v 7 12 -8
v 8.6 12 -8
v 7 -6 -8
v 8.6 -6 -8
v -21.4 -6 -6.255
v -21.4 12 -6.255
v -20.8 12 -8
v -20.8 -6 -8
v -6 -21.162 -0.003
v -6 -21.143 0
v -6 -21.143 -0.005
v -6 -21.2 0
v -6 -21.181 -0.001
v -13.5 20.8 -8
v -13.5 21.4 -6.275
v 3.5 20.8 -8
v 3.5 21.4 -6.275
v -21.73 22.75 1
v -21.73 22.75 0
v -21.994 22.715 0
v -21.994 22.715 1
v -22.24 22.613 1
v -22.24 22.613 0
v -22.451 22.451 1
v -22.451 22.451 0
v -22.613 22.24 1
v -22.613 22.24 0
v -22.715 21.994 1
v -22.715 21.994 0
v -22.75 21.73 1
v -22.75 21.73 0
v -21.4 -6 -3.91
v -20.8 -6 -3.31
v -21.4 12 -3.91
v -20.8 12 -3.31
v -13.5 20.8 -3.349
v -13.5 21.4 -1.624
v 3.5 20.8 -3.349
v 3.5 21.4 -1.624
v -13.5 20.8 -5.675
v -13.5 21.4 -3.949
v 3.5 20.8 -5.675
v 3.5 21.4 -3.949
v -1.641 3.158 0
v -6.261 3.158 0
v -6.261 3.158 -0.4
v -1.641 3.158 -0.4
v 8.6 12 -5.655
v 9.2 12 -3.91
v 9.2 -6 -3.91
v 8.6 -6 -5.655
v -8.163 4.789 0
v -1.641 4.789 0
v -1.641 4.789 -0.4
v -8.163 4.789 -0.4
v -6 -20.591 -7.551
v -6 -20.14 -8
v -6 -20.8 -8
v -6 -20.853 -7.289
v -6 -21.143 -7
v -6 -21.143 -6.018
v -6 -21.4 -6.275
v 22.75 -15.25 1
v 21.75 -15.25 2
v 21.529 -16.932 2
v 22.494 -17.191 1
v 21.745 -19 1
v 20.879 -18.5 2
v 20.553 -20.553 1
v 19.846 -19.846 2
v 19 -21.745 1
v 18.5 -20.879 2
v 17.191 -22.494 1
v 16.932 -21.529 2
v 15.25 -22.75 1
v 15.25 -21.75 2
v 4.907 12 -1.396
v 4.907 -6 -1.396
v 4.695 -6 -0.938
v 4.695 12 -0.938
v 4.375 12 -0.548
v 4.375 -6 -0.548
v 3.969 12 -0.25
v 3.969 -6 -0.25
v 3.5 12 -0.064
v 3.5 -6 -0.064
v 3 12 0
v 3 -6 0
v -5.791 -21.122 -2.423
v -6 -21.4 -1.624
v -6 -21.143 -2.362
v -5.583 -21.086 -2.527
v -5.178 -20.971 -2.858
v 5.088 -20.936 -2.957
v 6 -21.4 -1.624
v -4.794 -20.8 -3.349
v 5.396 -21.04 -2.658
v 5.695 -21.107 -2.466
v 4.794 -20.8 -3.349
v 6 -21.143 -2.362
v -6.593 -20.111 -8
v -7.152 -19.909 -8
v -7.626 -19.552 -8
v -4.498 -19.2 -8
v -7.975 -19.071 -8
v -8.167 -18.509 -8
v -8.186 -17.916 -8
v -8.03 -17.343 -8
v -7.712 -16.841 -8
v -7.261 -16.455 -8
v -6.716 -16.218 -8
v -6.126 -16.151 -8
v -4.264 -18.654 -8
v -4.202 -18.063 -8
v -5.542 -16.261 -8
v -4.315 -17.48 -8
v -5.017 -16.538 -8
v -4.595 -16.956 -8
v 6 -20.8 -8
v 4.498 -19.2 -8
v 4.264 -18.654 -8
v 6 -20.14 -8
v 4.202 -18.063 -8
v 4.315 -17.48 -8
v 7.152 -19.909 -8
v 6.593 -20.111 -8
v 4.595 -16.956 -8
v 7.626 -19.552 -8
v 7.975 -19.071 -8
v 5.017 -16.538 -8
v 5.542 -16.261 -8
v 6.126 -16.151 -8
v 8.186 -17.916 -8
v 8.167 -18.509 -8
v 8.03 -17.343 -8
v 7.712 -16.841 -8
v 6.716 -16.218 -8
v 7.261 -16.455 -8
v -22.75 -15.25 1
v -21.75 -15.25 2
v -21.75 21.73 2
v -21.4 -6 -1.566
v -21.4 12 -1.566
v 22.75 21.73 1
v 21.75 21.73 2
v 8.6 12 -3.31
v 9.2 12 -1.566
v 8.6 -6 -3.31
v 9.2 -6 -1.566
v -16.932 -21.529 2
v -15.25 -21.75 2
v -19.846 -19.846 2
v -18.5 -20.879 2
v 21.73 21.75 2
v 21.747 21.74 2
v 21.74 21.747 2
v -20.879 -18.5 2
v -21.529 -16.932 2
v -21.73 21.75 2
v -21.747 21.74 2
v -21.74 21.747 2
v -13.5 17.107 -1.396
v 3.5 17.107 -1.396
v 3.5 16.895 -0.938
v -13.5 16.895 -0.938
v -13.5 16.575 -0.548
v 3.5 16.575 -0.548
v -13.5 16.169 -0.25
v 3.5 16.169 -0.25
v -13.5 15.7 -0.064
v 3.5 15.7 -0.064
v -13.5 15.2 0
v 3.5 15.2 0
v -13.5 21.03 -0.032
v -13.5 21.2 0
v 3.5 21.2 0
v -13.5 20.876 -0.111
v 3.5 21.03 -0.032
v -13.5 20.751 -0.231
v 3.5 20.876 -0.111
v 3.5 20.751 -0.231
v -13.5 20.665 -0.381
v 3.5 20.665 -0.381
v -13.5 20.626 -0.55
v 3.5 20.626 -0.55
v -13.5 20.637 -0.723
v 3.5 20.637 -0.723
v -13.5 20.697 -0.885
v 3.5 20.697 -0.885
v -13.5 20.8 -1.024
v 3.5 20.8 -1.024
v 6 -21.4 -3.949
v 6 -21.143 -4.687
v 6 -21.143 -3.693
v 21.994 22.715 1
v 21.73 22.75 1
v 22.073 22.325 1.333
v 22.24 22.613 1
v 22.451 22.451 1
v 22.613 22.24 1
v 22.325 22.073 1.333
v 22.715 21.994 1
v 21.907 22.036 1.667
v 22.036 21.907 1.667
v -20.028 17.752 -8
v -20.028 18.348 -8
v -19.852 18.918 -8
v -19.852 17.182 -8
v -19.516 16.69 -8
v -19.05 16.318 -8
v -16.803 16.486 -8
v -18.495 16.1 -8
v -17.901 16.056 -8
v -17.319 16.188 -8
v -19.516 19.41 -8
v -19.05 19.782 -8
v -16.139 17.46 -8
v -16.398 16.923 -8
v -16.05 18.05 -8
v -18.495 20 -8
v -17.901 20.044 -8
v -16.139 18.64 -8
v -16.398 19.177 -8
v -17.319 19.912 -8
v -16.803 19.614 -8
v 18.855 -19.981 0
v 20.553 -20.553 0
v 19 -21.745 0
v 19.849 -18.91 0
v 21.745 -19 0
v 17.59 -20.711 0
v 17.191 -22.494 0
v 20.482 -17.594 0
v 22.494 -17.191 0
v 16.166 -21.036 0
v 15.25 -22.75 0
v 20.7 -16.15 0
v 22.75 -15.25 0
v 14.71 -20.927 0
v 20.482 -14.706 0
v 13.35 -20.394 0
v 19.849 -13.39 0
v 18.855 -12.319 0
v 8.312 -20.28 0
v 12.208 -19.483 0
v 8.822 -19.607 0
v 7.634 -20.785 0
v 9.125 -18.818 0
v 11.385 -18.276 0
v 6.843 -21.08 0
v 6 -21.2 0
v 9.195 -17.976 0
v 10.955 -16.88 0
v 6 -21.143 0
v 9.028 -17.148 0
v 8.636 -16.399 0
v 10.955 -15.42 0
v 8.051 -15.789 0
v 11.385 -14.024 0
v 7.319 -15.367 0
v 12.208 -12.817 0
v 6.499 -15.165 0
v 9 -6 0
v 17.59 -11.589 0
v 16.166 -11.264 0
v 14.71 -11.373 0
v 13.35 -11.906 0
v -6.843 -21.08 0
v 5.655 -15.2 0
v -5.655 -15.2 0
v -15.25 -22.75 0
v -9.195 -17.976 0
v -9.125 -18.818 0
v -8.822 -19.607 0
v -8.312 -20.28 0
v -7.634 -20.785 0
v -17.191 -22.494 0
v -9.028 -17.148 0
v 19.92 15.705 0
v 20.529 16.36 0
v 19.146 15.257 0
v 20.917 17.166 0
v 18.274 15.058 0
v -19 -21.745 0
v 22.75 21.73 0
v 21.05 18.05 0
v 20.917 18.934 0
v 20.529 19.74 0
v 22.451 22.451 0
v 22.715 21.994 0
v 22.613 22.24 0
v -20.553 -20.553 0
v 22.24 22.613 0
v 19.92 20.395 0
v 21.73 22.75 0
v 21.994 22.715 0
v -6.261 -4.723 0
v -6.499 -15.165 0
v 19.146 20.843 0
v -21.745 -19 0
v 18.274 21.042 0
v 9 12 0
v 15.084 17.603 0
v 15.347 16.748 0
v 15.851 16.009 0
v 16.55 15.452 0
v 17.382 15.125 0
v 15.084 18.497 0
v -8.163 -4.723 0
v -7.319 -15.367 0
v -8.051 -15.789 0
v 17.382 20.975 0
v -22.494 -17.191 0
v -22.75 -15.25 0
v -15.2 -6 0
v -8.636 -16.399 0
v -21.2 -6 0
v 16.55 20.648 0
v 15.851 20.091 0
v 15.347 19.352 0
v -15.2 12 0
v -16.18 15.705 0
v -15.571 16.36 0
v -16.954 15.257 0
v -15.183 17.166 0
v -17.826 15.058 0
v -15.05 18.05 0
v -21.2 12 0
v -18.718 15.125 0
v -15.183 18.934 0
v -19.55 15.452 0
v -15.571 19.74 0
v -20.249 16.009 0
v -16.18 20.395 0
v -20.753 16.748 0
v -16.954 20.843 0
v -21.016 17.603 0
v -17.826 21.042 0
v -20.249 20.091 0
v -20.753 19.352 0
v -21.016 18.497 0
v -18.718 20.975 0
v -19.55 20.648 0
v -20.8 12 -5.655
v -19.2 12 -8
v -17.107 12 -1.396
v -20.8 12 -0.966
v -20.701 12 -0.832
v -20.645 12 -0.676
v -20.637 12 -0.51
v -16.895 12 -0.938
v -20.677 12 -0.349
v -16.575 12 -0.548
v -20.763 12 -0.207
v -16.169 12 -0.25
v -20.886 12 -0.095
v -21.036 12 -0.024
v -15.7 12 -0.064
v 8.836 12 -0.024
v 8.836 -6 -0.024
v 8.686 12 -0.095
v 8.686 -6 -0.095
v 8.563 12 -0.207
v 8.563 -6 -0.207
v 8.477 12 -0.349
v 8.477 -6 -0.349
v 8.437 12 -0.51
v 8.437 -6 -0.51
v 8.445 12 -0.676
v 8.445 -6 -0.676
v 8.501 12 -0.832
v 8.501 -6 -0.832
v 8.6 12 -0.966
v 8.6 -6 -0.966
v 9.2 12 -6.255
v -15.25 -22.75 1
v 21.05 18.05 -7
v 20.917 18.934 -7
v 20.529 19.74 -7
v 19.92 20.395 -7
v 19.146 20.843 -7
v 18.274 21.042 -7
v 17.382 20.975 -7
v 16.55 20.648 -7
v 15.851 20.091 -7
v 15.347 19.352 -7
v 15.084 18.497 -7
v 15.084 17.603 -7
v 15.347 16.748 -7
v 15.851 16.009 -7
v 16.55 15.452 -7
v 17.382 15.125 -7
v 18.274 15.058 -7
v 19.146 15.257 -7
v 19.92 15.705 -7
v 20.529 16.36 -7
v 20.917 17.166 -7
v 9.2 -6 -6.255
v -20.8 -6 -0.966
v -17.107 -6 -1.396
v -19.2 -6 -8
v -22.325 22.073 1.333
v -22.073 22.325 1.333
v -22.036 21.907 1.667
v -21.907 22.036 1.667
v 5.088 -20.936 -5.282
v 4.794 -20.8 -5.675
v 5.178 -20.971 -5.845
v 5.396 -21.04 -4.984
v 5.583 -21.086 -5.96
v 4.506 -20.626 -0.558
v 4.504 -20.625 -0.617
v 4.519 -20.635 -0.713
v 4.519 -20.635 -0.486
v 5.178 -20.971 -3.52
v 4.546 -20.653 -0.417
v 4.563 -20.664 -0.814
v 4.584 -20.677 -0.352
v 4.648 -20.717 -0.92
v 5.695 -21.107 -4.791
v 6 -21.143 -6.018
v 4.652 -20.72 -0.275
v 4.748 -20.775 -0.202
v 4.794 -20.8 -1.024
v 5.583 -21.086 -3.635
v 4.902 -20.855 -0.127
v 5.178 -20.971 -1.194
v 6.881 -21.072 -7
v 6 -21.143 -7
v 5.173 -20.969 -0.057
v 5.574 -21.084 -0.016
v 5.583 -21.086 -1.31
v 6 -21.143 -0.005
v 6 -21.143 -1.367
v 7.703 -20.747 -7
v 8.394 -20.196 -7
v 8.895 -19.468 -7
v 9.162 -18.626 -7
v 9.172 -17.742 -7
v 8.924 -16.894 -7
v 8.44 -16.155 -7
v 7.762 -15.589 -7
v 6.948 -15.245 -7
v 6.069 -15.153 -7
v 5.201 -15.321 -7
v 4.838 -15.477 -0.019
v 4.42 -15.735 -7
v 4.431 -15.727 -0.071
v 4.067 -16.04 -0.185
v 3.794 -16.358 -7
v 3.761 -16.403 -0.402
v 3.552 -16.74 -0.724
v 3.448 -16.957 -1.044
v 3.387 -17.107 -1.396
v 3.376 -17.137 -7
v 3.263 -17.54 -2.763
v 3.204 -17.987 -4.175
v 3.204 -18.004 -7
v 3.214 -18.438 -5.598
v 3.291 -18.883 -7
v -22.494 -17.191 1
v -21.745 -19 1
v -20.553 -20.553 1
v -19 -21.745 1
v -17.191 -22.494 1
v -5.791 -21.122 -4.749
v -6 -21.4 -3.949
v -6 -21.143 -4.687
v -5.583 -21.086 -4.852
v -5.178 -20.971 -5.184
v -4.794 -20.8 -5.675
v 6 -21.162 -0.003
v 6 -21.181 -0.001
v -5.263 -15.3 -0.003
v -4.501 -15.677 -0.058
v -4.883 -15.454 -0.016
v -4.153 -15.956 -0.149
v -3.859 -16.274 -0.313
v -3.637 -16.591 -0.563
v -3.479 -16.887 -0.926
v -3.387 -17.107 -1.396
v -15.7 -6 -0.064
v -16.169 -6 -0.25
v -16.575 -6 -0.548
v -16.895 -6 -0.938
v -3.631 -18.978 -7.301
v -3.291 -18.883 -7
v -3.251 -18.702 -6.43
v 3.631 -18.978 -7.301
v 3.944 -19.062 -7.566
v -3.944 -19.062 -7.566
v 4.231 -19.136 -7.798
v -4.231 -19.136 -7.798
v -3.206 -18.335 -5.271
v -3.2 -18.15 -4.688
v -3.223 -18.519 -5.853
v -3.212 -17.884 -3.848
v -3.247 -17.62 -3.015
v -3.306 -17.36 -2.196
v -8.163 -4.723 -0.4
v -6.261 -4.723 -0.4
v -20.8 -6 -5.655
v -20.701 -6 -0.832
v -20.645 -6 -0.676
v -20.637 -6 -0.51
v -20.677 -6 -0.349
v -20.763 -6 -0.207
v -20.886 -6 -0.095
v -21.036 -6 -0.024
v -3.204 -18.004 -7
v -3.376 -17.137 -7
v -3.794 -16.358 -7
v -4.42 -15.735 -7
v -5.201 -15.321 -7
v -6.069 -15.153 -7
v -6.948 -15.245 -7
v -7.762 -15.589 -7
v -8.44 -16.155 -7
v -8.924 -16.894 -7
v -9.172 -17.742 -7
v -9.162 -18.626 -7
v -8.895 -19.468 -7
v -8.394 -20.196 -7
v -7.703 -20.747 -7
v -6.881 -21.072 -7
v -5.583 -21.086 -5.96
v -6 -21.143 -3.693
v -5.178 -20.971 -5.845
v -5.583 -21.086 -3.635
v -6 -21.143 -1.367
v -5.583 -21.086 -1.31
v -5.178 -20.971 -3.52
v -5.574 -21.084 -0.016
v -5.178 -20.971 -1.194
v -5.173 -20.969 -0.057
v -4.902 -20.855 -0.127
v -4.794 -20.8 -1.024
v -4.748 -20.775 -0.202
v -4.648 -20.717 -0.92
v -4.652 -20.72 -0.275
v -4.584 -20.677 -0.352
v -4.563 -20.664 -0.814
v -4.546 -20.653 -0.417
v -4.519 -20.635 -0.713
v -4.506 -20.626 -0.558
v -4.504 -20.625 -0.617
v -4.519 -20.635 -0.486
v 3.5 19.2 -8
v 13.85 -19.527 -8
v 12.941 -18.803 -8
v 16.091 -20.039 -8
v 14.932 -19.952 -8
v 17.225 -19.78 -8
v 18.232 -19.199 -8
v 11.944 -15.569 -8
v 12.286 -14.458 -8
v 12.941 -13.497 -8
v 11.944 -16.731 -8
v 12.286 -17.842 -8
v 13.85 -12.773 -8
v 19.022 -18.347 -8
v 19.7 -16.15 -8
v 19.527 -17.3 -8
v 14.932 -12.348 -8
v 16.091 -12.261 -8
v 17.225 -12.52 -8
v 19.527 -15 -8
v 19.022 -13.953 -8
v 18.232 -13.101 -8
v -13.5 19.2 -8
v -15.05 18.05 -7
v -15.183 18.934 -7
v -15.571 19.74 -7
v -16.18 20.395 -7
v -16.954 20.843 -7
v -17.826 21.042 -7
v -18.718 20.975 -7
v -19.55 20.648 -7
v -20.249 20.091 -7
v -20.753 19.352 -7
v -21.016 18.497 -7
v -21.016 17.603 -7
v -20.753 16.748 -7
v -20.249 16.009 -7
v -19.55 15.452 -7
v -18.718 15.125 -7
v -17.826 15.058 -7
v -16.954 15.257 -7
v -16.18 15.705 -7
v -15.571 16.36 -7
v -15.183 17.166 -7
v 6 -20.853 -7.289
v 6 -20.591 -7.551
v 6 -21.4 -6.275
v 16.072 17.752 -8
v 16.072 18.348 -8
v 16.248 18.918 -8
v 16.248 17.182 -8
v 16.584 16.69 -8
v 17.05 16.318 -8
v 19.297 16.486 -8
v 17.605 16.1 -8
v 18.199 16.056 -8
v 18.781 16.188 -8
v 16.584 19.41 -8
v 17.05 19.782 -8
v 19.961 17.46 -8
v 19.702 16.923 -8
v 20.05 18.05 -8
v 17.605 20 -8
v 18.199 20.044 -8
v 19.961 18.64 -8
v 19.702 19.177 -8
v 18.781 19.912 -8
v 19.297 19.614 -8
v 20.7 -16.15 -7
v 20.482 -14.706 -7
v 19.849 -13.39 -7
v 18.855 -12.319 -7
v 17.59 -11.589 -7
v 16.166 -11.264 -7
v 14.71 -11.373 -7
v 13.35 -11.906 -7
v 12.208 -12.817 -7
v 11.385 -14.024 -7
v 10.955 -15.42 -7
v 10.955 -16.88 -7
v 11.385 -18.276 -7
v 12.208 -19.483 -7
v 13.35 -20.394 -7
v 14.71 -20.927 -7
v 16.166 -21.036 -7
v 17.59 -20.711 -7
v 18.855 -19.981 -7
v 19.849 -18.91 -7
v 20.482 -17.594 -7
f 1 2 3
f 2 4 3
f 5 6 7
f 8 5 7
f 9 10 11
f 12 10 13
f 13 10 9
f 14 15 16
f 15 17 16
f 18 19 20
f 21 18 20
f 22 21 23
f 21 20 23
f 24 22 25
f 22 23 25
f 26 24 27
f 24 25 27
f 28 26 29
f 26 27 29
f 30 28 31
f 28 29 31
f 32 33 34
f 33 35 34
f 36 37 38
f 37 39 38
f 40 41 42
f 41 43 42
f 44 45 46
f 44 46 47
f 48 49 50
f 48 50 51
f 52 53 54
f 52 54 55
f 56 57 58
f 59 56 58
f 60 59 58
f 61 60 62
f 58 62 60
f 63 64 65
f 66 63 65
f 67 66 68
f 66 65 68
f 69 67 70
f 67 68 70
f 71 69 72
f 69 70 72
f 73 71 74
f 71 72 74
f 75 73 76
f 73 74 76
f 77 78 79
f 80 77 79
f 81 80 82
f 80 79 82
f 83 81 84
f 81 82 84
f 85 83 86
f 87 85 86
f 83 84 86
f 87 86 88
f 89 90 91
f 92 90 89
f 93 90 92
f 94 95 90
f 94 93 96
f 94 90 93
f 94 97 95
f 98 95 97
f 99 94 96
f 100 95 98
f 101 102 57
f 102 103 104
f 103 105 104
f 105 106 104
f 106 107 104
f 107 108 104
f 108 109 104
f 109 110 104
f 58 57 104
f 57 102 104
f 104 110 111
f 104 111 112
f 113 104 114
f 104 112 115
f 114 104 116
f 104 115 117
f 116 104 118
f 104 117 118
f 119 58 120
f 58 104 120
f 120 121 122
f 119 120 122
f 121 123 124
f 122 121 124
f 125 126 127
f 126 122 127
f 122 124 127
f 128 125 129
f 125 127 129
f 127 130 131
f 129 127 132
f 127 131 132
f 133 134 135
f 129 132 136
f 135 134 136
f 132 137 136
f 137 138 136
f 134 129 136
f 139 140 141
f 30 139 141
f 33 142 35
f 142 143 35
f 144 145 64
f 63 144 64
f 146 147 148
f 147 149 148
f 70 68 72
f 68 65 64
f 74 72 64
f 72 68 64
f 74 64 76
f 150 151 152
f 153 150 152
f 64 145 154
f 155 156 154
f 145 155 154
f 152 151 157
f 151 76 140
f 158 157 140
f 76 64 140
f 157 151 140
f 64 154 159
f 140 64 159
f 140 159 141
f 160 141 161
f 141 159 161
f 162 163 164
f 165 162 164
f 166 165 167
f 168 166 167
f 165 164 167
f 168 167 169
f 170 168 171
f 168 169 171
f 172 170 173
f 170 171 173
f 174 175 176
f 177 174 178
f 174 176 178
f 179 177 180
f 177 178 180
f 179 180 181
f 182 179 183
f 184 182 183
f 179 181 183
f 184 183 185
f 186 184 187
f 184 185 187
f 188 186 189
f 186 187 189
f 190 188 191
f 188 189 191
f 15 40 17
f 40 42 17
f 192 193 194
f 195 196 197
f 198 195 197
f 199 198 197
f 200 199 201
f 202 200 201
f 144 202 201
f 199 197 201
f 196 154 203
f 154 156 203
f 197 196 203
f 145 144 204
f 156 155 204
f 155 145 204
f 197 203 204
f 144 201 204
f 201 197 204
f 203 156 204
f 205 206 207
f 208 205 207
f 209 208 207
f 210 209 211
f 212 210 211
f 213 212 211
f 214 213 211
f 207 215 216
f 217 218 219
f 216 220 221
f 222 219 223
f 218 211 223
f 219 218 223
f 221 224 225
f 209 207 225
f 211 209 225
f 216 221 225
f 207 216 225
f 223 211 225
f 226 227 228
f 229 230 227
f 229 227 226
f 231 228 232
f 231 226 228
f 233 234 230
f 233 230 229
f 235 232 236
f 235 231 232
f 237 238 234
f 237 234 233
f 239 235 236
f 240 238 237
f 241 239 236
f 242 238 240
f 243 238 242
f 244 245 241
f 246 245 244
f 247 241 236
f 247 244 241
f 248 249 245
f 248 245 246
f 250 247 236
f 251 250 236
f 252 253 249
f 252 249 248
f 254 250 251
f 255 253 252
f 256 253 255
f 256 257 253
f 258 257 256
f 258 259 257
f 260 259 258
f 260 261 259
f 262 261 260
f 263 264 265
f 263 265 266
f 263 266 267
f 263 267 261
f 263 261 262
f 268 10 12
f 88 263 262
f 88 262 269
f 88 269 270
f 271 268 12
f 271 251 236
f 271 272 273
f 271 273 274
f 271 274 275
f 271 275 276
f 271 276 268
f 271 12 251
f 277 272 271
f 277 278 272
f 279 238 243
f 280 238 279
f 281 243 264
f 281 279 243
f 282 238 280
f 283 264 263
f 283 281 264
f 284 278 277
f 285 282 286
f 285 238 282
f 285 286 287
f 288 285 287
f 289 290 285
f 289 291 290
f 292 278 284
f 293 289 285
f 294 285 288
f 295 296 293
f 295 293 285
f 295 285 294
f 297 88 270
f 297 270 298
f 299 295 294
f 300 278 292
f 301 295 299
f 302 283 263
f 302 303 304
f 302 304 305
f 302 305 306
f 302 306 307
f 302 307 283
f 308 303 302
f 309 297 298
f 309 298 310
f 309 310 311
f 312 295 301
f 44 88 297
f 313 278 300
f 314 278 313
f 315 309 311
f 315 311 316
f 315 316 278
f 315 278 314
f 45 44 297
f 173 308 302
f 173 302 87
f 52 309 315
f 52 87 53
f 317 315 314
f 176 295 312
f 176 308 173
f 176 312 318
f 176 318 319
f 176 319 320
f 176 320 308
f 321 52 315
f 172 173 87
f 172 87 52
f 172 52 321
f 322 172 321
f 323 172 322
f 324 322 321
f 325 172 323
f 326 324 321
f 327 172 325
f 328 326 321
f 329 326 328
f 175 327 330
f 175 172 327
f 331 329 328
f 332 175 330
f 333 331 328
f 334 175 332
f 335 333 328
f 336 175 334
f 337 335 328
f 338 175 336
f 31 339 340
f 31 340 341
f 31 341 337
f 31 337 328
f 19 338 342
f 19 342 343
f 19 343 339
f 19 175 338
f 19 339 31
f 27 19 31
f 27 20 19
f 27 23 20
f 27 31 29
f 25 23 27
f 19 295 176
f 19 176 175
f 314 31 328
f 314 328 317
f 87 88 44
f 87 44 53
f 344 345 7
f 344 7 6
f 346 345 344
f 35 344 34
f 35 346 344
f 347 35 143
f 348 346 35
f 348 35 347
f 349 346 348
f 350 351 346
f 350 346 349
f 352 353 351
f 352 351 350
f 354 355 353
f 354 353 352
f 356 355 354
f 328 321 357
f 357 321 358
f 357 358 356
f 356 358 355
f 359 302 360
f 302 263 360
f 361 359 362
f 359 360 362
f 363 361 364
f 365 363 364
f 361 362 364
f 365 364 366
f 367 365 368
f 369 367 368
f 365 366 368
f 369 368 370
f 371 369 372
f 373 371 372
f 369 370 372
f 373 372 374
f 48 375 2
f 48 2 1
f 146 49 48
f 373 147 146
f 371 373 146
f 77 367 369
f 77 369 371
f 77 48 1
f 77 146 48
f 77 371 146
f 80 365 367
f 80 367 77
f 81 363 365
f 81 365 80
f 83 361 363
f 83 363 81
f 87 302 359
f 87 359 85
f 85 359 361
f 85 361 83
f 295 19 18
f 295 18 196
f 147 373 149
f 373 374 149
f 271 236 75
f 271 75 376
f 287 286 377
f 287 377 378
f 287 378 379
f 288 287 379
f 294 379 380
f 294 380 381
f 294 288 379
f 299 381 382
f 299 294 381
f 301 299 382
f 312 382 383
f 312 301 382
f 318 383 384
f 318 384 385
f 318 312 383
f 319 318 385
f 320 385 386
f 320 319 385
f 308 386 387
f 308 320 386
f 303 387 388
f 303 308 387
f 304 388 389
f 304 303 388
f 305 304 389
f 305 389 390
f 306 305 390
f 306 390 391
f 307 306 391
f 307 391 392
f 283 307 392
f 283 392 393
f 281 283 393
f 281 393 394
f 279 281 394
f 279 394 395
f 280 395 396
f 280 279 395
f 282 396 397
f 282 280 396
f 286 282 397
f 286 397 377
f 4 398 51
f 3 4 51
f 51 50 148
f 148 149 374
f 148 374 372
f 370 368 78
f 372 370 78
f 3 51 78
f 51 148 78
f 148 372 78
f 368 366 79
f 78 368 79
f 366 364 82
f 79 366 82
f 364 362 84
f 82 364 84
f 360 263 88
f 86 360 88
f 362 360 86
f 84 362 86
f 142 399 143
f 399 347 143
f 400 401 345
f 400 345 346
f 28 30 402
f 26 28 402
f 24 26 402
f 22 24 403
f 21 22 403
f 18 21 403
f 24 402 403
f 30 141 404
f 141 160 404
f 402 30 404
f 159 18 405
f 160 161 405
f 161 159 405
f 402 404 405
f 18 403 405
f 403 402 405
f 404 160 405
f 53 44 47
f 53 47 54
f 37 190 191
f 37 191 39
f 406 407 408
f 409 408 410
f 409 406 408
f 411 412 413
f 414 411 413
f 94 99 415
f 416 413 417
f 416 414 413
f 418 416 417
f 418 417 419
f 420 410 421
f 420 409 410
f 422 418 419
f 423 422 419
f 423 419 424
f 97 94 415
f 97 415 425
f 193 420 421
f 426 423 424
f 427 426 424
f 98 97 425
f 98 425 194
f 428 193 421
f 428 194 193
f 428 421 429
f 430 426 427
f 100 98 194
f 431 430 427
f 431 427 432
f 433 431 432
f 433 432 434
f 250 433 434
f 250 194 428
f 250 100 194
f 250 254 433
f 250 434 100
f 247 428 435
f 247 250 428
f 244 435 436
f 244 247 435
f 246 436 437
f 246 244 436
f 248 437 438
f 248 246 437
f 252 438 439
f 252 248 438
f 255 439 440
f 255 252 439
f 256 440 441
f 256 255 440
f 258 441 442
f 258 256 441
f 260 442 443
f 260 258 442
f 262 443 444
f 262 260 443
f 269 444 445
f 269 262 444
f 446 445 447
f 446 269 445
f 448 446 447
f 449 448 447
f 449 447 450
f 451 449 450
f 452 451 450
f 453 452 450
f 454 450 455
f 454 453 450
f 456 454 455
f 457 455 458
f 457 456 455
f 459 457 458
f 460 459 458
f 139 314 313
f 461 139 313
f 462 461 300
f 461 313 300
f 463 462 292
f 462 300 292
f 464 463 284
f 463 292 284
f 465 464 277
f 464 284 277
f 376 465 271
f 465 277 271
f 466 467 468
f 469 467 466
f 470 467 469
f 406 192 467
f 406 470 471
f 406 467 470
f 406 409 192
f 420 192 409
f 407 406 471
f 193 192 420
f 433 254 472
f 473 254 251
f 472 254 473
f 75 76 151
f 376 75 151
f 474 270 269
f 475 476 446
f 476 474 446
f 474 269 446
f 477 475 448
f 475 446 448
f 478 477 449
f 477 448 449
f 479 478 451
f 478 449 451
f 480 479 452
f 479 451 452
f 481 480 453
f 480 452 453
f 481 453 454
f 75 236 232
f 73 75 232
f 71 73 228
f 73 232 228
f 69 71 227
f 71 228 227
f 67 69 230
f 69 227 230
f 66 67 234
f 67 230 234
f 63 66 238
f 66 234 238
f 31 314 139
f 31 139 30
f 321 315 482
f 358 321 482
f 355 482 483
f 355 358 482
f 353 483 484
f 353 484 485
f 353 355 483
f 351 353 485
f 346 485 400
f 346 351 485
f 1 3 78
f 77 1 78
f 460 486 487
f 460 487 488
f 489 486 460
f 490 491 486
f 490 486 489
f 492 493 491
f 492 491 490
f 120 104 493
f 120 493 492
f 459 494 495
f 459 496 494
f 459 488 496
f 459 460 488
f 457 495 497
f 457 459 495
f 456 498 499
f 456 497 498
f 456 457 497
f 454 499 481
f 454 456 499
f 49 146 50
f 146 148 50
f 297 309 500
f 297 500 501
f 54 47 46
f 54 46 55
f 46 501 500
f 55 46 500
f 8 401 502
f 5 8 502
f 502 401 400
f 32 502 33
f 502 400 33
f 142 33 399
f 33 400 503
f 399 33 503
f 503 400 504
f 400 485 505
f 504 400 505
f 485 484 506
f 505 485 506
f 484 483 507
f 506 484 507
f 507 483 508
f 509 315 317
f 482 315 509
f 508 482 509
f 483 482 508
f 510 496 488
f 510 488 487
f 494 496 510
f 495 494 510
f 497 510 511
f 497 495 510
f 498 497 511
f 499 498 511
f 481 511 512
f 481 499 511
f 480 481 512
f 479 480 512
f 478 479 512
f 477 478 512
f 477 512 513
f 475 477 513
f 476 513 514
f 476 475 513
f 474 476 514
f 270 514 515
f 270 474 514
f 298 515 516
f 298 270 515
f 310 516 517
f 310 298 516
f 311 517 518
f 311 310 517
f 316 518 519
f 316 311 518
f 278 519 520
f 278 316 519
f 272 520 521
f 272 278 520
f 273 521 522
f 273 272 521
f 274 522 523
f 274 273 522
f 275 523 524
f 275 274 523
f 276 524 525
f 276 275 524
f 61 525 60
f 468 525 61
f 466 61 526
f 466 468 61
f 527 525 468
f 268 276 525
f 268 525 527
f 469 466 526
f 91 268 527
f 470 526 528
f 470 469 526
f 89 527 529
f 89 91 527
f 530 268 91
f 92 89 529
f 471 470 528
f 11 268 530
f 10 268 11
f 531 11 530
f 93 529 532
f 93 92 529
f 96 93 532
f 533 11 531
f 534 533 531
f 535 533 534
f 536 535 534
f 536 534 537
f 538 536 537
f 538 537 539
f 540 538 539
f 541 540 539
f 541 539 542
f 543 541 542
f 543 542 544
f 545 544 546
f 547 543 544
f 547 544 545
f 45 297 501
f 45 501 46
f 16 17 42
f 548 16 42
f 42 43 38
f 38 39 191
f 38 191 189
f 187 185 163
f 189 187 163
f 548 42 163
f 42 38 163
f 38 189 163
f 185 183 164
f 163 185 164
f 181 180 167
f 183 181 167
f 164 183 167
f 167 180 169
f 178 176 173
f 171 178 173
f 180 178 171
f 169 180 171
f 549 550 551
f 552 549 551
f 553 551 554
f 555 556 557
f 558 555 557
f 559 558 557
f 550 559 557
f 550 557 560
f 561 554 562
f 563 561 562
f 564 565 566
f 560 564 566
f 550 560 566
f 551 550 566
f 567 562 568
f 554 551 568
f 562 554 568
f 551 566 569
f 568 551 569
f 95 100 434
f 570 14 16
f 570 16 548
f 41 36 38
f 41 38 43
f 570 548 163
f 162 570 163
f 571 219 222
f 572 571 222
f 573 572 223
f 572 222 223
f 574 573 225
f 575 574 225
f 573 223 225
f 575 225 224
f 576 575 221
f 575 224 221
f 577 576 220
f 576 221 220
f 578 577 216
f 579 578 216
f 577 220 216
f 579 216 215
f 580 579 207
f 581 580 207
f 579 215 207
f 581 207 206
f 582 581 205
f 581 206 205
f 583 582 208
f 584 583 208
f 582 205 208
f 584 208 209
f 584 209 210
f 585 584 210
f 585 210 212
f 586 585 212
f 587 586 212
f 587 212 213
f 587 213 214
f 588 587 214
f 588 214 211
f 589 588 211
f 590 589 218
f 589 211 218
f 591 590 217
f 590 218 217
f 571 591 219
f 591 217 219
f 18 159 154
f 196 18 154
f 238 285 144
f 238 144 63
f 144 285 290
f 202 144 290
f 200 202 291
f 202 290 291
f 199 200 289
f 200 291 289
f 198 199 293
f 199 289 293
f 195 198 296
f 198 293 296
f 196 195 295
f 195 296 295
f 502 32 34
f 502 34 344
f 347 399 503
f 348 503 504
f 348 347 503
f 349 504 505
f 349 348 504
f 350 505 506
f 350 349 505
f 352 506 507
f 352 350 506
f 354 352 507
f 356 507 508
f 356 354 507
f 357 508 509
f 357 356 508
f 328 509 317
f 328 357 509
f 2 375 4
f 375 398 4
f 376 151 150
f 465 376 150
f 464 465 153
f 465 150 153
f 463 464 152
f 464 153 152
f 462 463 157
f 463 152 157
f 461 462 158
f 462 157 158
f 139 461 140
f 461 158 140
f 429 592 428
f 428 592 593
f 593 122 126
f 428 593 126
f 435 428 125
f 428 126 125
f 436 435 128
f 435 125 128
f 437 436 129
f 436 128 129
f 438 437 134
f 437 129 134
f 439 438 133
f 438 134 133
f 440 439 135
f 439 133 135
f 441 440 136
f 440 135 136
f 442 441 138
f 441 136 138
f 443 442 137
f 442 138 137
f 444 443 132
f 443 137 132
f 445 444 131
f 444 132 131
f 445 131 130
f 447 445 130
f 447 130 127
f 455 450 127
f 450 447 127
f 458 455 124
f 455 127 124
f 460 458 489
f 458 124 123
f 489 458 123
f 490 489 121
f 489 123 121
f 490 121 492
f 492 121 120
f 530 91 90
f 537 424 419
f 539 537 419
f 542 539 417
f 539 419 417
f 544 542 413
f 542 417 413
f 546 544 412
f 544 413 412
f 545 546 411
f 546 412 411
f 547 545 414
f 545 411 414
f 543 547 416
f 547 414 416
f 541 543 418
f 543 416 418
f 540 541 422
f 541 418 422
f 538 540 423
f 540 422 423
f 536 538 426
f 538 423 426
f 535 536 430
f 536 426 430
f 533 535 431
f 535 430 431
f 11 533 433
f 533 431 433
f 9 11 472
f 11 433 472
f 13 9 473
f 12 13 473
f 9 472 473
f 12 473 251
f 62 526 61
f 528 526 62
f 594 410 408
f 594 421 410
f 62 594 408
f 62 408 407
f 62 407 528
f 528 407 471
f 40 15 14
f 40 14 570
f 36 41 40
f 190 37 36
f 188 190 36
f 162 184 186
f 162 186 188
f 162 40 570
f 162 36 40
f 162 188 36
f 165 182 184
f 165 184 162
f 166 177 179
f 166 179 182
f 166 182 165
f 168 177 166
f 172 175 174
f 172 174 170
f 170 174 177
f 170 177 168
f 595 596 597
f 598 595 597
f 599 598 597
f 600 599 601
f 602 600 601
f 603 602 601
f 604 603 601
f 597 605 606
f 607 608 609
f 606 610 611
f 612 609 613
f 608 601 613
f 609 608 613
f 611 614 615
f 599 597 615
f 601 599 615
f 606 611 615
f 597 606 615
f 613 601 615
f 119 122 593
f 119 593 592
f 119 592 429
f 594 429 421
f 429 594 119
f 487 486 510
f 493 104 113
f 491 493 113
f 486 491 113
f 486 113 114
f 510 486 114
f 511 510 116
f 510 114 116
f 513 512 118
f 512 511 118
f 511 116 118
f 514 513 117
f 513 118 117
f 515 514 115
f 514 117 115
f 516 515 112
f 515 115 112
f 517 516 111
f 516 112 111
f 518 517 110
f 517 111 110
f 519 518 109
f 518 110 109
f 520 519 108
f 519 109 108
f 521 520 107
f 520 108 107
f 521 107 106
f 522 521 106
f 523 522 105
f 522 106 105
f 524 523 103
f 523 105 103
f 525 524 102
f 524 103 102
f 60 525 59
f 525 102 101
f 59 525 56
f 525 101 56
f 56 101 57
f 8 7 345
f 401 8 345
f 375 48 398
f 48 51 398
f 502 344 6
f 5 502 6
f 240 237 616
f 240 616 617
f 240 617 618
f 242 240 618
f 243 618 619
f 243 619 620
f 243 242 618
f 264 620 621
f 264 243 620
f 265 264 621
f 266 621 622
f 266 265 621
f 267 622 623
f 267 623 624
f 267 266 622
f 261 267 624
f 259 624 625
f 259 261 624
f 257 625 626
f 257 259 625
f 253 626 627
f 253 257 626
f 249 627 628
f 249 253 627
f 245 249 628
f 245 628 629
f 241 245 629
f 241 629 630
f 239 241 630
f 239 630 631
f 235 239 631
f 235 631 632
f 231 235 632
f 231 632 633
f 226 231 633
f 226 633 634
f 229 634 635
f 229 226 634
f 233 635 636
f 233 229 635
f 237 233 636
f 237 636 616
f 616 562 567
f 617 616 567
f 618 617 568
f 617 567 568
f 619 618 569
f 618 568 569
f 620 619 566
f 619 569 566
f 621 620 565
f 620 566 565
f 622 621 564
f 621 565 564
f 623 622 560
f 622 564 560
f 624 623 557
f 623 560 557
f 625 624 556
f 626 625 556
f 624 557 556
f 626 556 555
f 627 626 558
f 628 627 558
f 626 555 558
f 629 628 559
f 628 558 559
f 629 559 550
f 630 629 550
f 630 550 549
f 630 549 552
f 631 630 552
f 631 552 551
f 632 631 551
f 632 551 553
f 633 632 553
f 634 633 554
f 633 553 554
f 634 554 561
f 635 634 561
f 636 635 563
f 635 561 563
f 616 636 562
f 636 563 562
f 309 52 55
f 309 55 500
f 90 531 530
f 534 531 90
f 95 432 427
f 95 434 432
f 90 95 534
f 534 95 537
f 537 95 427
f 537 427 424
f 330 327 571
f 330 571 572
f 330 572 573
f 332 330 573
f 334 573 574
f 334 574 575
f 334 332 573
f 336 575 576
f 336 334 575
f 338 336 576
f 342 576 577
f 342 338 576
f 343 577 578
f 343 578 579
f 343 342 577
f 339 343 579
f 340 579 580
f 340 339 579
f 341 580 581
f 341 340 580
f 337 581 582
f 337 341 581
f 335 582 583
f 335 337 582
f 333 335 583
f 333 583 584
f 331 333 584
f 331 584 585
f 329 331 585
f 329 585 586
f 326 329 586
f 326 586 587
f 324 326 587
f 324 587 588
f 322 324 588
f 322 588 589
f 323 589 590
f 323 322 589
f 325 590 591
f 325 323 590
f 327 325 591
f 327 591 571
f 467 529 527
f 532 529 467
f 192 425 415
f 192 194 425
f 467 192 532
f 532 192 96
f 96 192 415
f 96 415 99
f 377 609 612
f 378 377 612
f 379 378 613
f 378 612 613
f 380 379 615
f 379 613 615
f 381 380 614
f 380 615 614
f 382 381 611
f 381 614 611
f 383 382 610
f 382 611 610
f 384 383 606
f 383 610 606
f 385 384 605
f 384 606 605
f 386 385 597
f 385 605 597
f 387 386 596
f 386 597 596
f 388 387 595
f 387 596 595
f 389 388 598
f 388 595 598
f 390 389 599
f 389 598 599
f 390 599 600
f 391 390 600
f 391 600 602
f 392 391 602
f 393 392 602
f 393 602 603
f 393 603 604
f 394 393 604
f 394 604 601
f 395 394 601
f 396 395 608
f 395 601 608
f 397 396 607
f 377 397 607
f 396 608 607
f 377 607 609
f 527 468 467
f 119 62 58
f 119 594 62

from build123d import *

# Parameters (mm, degrees)
PAD001_DEPTH    = 2
SKETCH002_R     = 3
SKETCH002_R_2   = 4.9
PAD002_DEPTH    = 8
CHAMFER_SIZE    = 1
CHAMFER001_SIZE = 1
PAD003_DEPTH    = 9
PAD004_DEPTH    = 6
PAD005_DEPTH    = 8.5
PAD006_DEPTH    = 0.4


with BuildPart() as part:
    # Sketch001 → Pad001 (new body)
    with BuildSketch(Plane.XY):
        with BuildLine():
            Line((-21.73, 22.75), (21.73, 22.75))
            ThreePointArc((22.75, 21.73), (22.451249, 22.451249), (21.73, 22.75))
            Line((22.75, 21.73), (22.75, -15.25))
            ThreePointArc((15.25, -22.75), (20.553301, -20.553301), (22.75, -15.25))
            Line((15.25, -22.75), (-15.25, -22.75))
            ThreePointArc((-22.75, -15.25), (-20.553301, -20.553301), (-15.25, -22.75))
            Line((-22.75, -15.25), (-22.75, 21.73))
            ThreePointArc((-21.73, 22.75), (-22.451249, 22.451249), (-22.75, 21.73))
        make_face()
    extrude(amount=PAD001_DEPTH)

    # Sketch002 → Pad002 (join)
    with BuildSketch(Plane.XY):
        with Locations((-18.05, 18.05)):
            Circle(SKETCH002_R)
        with Locations((18.05, 18.05)):
            Circle(SKETCH002_R)
        with Locations((6.2, -18.15)):
            Circle(SKETCH002_R)
        with Locations((-6.2, -18.15)):
            Circle(SKETCH002_R)
        with Locations((15.8, -16.15)):
            Circle(SKETCH002_R_2)
    extrude(amount=-PAD002_DEPTH)

    # Chamfer
    chamfer_edges = [part.edges().sort_by_distance(p)[0] for p in [
        (15.05, 18.05, -8),
        (-21.05, 18.05, -8),
        (-9.2, -18.15, -8),
        (3.2, -18.15, -8),
        (10.9, -16.15, -8),
    ]]
    chamfer(chamfer_edges, length=CHAMFER_SIZE)

    # Chamfer001
    chamfer001_edges = [part.edges().sort_by_distance(p)[0] for p in [
        (0, -22.75, 2),
    ]]
    chamfer(chamfer001_edges, length=CHAMFER001_SIZE)

    # Sketch003 → Pad003 (join, symmetric)
    with BuildSketch(Plane.XZ.offset(-3)):
        with BuildLine():
            ThreePointArc((-20.8, -0.965685), (-20.677375, -0.349207), (-21.2, 0))
            Line((-21.2, 0), (-15.2, 0))
            ThreePointArc((-15.2, 0), (-16.381381, -0.386204), (-17.106508, -1.395661))
            Line((-19.2, -8), (-17.106508, -1.395661))
            Line((-20.8, -8), (-19.2, -8))
            Line((-21.4, -6.255228), (-20.8, -8))
            Line((-20.8, -5.655228), (-21.4, -6.255228))
            Line((-21.4, -3.910457), (-20.8, -5.655228))
            Line((-20.8, -3.310457), (-21.4, -3.910457))
            Line((-21.4, -1.565685), (-20.8, -3.310457))
            Line((-20.8, -0.965685), (-21.4, -1.565685))
        make_face()
        with BuildLine():
            Line((3, 0), (9, 0))
            ThreePointArc((9, 0), (8.477375, -0.349207), (8.6, -0.965685))
            Line((8.6, -0.965685), (9.2, -1.565685))
            Line((9.2, -1.565685), (8.6, -3.310457))
            Line((8.6, -3.310457), (9.2, -3.910457))
            Line((9.2, -3.910457), (8.6, -5.655228))
            Line((8.6, -5.655228), (9.2, -6.255228))
            Line((9.2, -6.255228), (8.6, -8))
            Line((8.6, -8), (7, -8))
            Line((7, -8), (4.906508, -1.395661))
            ThreePointArc((4.906508, -1.395661), (4.181381, -0.386204), (3, 0))
        make_face()
    extrude(amount=PAD003_DEPTH, both=True)

    # Sketch004 → Pad004 (join, symmetric)
    with BuildSketch(Plane.YZ):
        with BuildLine():
            ThreePointArc((-20.8, -1.023773), (-20.665406, -0.381157), (-21.2, 0))
            Line((-21.2, 0), (-15.2, 0))
            ThreePointArc((-15.2, 0), (-16.381381, -0.386204), (-17.106508, -1.395661))
            Line((-19.2, -8), (-17.106508, -1.395661))
            Line((-20.8, -8), (-19.2, -8))
            Line((-21.4, -6.274591), (-20.8, -8))
            Line((-20.8, -5.674591), (-21.4, -6.274591))
            Line((-21.4, -3.949182), (-20.8, -5.674591))
            Line((-20.8, -3.349182), (-21.4, -3.949182))
            Line((-21.4, -1.623773), (-20.8, -3.349182))
            Line((-20.8, -1.023773), (-21.4, -1.623773))
        make_face()
    extrude(amount=PAD004_DEPTH, both=True)

    # Sketch005 → Pad005 (join, symmetric)
    with BuildSketch(Plane.YZ.offset(-5)):
        with BuildLine():
            Line((15.2, 0), (21.2, 0))
            ThreePointArc((21.2, 0), (20.665406, -0.381157), (20.8, -1.023773))
            Line((20.8, -1.023773), (21.4, -1.623773))
            Line((21.4, -1.623773), (20.8, -3.349182))
            Line((20.8, -3.349182), (21.4, -3.949182))
            Line((21.4, -3.949182), (20.8, -5.674591))
            Line((20.8, -5.674591), (21.4, -6.274591))
            Line((21.4, -6.274591), (20.8, -8))
            Line((20.8, -8), (19.2, -8))
            Line((19.2, -8), (17.106508, -1.395661))
            ThreePointArc((17.106508, -1.395661), (16.381381, -0.386204), (15.2, 0))
        make_face()
    extrude(amount=PAD005_DEPTH, both=True)

    # Sketch006 → Pad006 (new body)
    with BuildSketch(Plane(origin=(0, 0, 0), x_dir=(-1, 0, 0), z_dir=(0, 0, 1))):
        Polygon((8.162951, -4.789), (8.162951, 4.722677), (6.260616, 4.722677), (6.260616, -3.158427), (1.640658, -3.158427), (1.640658, -4.789), align=None)
    extrude(amount=-PAD006_DEPTH)


solid = part.part
